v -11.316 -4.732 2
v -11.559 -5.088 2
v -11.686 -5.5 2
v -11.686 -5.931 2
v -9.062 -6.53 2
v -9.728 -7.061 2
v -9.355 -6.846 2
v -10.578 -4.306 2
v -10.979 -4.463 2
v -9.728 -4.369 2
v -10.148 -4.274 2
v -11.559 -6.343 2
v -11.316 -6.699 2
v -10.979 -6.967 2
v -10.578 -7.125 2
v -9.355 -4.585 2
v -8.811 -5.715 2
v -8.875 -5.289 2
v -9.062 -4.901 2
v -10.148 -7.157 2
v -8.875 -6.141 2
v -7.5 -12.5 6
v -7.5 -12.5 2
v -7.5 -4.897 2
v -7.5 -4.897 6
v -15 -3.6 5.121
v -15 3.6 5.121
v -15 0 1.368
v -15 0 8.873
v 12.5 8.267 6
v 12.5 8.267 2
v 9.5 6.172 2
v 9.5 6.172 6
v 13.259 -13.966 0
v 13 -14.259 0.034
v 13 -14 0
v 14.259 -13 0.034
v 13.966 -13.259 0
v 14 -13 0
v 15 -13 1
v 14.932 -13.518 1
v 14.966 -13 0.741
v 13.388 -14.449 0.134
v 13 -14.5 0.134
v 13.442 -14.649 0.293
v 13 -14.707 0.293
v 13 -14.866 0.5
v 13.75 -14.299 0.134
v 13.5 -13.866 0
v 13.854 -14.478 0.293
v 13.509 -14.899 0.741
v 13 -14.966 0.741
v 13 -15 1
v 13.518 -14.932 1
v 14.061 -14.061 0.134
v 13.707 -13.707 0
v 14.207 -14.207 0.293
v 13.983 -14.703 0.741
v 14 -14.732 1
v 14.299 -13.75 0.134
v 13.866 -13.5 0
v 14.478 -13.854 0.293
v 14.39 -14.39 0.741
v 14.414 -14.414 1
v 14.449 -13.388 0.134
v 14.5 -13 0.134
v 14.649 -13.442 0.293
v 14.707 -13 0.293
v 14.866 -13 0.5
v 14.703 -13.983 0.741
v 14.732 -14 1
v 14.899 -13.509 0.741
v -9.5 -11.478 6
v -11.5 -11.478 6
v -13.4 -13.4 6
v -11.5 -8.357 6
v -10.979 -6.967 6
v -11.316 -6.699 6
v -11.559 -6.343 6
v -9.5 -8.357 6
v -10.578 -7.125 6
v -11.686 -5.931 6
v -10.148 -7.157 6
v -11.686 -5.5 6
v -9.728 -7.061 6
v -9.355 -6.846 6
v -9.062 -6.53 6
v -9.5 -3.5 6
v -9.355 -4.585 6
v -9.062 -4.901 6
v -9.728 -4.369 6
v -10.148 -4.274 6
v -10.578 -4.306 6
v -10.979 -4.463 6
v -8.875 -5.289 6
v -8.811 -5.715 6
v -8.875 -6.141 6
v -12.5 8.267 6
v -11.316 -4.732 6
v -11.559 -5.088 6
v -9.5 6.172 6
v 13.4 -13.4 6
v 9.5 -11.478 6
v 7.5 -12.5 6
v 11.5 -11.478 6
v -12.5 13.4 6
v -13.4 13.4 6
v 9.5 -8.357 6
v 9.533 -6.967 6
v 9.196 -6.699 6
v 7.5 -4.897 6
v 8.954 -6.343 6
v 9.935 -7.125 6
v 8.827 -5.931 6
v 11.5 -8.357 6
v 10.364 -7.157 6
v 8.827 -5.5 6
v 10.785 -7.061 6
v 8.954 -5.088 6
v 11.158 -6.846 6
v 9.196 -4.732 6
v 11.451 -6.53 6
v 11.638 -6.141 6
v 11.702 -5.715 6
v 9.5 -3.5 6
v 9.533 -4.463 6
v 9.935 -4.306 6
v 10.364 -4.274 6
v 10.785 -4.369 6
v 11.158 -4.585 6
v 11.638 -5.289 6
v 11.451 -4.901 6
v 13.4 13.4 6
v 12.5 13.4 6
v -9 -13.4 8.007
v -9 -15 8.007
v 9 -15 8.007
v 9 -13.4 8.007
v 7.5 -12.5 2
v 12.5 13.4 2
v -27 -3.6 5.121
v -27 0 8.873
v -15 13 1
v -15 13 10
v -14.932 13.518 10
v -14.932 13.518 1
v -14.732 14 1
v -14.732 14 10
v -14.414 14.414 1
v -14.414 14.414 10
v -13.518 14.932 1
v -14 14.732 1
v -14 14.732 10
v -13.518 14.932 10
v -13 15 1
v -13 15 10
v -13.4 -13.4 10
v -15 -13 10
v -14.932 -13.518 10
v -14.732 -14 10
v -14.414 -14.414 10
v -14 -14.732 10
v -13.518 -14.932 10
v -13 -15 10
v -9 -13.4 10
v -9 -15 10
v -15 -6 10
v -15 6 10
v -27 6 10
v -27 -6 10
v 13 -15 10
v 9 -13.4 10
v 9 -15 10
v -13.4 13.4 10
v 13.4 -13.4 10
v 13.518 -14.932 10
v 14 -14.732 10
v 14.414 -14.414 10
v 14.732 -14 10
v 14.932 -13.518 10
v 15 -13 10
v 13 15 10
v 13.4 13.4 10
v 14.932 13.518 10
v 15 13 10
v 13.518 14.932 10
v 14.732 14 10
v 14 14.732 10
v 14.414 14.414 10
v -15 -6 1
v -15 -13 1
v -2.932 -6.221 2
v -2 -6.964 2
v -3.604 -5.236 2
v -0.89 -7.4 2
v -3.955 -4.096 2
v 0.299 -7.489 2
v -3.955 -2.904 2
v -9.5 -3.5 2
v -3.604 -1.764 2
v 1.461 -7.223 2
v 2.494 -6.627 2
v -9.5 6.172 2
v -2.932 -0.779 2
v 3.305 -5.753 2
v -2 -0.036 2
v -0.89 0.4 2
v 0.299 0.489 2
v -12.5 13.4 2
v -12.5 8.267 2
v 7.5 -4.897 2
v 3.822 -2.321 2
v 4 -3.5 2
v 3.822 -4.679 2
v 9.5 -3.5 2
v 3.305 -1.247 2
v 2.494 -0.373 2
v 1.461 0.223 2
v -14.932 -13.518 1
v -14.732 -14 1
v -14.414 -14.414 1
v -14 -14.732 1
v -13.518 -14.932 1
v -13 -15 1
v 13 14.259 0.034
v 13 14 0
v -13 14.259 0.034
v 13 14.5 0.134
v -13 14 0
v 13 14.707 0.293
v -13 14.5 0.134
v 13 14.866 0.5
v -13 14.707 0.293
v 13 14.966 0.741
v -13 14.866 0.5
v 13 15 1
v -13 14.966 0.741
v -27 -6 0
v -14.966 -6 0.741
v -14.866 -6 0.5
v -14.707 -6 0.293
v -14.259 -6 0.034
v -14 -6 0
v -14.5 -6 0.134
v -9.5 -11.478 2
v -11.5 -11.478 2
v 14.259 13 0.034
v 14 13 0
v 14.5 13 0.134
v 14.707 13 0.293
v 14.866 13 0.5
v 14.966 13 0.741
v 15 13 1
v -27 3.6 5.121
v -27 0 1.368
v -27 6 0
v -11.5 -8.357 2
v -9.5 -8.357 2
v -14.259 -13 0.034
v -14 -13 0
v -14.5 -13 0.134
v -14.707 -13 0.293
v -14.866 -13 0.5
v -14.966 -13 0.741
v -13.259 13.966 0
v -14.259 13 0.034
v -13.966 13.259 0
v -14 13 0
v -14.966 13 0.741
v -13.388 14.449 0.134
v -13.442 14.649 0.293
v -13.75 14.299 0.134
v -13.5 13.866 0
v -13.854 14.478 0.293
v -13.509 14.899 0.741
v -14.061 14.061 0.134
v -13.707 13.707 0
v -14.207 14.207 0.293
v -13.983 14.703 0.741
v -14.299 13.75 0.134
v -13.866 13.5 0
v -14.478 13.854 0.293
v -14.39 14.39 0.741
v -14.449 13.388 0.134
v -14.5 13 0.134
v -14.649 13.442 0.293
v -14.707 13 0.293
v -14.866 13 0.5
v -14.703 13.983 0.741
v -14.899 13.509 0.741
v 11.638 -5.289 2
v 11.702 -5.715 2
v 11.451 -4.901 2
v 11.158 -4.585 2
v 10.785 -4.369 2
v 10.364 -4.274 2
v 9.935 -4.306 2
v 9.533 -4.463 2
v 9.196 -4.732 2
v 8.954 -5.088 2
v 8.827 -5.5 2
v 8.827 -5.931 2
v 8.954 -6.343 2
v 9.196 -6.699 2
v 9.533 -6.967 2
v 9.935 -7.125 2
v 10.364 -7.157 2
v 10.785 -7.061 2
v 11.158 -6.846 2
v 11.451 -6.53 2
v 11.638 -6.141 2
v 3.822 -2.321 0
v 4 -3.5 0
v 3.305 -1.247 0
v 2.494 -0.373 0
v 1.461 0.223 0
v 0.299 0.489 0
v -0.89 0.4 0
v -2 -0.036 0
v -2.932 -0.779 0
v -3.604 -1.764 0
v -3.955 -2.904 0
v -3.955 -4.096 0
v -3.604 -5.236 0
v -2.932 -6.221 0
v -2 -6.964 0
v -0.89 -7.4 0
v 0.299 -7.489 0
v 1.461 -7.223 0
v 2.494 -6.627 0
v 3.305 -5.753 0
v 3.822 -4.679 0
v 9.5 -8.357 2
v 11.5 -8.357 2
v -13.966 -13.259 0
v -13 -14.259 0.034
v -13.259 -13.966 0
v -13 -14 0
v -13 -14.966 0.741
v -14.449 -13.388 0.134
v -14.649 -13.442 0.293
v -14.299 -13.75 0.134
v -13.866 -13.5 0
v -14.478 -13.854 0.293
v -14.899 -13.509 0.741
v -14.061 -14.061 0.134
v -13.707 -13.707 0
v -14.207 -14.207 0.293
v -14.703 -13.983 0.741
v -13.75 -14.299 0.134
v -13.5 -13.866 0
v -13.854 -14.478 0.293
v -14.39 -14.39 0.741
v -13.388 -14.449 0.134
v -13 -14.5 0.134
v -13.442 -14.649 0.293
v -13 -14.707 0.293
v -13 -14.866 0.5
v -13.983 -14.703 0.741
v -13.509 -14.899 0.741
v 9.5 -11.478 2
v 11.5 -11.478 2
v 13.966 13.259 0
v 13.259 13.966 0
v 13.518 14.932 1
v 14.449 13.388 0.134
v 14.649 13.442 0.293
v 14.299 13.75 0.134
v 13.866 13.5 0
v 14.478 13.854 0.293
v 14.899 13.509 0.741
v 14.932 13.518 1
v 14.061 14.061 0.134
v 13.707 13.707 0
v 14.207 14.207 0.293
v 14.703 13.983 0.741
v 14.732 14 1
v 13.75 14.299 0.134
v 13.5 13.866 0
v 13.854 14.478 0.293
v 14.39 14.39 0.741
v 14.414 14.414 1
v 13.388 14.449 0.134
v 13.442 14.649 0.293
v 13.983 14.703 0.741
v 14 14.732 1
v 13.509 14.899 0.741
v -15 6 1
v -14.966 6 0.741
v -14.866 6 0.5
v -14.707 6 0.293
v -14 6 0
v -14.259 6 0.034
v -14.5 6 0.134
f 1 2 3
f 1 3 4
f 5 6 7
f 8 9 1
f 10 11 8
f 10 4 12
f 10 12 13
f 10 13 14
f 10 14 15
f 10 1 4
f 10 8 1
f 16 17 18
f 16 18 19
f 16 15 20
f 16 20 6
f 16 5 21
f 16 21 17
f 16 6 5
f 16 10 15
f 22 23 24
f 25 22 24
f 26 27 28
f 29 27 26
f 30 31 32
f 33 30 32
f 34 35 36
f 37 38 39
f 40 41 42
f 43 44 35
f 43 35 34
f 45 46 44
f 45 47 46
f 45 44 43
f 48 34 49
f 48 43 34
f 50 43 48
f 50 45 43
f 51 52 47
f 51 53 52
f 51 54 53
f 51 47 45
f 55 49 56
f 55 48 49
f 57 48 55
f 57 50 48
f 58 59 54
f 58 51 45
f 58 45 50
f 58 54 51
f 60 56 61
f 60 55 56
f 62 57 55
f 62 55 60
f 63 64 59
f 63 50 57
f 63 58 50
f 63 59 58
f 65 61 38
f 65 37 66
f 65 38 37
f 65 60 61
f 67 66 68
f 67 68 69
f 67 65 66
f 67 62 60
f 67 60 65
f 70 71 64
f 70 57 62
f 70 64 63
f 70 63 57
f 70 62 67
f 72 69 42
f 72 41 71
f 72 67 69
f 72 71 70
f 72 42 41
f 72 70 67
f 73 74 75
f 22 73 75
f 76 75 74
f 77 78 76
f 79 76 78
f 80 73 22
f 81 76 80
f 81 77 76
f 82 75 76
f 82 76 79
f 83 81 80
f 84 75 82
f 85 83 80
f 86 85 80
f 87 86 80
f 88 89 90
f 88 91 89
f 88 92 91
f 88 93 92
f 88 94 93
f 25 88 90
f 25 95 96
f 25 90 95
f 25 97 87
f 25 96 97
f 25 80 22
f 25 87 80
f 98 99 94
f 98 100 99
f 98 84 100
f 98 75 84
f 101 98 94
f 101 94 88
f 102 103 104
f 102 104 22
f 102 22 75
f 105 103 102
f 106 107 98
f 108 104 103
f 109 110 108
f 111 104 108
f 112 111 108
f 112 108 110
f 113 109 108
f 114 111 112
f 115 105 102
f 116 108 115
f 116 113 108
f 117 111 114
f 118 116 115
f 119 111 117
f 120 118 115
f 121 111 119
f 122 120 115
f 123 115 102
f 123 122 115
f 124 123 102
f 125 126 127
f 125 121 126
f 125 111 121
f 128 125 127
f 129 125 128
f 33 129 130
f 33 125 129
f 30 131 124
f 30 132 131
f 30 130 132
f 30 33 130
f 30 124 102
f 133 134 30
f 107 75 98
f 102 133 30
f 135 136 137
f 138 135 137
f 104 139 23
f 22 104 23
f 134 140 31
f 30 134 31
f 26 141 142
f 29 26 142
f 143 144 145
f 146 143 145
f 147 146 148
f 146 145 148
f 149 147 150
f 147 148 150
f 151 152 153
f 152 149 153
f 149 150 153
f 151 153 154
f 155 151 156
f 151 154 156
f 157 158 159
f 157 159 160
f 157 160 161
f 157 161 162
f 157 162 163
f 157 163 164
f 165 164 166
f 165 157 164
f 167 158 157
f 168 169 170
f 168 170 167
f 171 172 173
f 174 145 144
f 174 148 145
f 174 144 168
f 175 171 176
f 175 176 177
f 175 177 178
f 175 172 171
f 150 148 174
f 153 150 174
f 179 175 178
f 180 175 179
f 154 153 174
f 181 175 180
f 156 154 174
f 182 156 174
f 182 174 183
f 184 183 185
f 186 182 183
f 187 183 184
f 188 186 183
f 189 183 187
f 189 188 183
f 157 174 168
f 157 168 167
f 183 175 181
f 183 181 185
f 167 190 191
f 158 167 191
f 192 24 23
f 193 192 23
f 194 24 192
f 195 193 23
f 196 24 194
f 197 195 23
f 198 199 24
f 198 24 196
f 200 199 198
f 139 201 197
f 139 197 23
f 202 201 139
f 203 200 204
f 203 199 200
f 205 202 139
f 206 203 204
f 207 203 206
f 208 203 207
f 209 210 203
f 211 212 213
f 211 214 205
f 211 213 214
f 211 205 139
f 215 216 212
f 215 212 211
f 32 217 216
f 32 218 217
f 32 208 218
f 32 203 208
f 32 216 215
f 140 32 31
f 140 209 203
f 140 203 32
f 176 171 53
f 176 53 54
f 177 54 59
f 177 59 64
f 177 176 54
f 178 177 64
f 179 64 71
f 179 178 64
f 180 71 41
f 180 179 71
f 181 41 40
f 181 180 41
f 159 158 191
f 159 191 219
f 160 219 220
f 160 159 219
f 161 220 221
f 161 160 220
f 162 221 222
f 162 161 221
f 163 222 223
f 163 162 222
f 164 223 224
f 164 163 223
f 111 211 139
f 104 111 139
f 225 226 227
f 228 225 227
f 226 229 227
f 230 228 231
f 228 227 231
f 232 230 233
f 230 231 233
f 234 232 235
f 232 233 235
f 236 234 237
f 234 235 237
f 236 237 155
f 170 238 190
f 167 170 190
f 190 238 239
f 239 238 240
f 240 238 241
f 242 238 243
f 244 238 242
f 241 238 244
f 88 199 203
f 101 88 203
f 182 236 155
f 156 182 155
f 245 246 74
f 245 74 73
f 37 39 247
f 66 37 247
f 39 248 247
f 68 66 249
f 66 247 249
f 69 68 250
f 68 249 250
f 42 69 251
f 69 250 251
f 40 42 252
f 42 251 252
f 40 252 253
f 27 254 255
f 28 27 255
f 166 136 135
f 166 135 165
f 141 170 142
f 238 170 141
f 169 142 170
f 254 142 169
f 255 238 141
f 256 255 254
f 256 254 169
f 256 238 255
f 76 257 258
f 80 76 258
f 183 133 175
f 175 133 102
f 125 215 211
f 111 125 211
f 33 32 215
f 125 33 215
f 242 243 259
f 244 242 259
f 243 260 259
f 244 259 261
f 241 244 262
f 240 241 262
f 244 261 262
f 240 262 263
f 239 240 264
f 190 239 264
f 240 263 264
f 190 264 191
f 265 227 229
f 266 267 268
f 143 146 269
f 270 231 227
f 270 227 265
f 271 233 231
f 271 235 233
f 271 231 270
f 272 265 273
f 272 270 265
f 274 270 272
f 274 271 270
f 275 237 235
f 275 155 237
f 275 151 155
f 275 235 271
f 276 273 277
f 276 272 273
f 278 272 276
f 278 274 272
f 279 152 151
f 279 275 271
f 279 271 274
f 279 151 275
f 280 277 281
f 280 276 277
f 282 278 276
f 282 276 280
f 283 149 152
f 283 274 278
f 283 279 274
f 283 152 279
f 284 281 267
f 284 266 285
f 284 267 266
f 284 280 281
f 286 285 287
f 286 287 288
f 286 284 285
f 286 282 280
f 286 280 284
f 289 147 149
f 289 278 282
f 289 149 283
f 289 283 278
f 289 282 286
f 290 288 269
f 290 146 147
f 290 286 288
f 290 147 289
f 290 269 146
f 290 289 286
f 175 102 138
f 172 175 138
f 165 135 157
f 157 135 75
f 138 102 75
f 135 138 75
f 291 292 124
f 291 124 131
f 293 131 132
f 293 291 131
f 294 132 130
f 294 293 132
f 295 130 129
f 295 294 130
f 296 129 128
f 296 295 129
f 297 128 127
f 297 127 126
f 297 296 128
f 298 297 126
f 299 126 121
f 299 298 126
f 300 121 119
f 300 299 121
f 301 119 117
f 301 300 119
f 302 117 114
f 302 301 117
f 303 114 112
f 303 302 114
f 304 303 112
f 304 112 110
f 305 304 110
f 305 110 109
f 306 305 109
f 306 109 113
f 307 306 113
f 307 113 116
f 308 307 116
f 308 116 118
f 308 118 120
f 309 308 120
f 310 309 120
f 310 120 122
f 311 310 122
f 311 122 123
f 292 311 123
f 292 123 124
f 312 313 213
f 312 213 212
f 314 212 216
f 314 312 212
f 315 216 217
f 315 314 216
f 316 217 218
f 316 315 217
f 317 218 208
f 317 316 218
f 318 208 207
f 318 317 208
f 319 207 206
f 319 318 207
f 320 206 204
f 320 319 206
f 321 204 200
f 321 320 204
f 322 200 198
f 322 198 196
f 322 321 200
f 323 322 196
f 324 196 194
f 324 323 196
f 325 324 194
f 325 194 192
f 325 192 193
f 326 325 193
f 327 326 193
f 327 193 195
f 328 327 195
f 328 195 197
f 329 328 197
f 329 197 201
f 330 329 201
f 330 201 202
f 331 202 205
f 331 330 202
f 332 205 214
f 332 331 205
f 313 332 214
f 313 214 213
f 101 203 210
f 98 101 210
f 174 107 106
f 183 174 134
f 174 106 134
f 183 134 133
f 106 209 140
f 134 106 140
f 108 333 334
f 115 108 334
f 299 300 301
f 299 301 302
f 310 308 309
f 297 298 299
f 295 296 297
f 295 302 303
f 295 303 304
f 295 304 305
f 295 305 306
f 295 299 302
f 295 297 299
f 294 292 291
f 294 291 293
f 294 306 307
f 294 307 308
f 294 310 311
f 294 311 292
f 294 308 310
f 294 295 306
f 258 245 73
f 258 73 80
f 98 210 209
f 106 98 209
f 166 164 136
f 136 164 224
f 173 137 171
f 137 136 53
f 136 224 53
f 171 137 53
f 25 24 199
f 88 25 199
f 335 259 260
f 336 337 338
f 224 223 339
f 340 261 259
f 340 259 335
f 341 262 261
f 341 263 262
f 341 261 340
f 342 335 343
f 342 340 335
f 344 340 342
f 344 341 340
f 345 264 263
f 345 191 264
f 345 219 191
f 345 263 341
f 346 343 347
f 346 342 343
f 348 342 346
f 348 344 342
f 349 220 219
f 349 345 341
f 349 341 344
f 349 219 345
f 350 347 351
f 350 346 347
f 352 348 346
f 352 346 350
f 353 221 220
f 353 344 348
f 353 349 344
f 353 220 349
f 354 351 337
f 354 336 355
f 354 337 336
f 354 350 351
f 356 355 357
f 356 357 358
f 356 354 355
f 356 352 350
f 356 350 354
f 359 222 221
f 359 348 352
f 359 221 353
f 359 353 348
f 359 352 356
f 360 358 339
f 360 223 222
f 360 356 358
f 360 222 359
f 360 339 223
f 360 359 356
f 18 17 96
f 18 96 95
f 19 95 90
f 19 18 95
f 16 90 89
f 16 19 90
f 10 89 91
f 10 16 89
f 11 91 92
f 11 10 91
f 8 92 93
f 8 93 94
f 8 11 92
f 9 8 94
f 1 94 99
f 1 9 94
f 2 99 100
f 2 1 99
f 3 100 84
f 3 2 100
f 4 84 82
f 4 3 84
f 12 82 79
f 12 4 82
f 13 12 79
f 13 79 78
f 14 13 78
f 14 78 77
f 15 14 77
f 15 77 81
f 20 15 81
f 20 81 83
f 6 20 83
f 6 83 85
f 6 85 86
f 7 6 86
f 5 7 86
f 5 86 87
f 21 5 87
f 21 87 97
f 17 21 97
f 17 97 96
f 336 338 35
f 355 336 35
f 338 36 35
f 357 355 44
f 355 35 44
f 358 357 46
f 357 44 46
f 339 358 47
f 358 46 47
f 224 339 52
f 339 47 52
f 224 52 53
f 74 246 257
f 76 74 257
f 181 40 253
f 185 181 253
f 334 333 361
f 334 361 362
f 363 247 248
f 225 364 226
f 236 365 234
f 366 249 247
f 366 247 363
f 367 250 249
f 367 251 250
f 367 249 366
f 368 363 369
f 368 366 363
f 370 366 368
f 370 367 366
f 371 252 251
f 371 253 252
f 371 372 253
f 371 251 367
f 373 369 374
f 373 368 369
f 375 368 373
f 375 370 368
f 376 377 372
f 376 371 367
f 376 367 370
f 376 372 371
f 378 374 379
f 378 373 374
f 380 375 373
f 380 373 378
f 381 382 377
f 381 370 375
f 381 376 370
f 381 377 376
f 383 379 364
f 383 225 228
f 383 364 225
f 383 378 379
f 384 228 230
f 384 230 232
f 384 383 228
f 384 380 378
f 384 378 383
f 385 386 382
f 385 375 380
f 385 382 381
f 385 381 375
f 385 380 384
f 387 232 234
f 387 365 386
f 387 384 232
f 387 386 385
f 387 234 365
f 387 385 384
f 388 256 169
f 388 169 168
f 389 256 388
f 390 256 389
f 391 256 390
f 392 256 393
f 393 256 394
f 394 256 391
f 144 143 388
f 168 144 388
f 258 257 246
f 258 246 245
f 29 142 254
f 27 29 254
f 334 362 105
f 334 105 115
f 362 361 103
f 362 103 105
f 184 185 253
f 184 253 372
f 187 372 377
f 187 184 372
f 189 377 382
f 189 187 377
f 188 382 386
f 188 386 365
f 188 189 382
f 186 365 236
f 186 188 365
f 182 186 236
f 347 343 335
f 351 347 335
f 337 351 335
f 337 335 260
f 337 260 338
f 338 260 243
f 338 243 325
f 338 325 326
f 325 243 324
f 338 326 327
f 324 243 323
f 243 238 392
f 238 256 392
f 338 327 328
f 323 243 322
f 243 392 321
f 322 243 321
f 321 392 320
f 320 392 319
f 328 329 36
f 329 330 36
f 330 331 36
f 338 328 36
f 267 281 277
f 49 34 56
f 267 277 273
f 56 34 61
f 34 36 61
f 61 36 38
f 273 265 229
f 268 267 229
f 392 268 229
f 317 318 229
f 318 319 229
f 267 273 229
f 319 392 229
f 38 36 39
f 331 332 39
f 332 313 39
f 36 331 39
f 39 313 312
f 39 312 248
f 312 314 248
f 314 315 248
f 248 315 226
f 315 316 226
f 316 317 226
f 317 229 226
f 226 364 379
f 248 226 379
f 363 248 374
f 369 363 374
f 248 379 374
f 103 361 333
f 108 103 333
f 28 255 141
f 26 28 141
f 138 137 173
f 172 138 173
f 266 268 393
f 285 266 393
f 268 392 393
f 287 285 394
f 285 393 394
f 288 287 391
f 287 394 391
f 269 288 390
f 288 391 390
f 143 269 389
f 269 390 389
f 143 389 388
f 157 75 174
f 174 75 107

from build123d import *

# Parameters (mm, degrees)
F0_W     = 12
F0_H     = 12
F1_DEPTH = 10
F0_W_2   = 2
F0_H_2   = 3.1217085198
F0_R     = 1.4457822704
F2_DEPTH = 6
F0_R_2   = 4
F0_W_3   = 25
F0_H_3   = 0.9
F3_DEPTH = 2
F5_DEPTH = 12
F6_R     = 2
F7_R     = 1
F8_W     = 18
F8_H     = 1.9928832203
F9_DEPTH = 25


# Not quite as in the source:
# - a feature names something its author has since deleted; it is built from what else it names


with BuildPart() as f1:
    # F0 (on Top) → F1 (new body)
    with BuildSketch(Plane.XY):
        Polygon((15, -15), (15, 15), (-15, 15), (-15, 6), (-15, -6), (-15, -15), align=None)
        Polygon((12.5, 13.4), (13.4, 13.4), (13.4, -13.4), (-13.4, -13.4), (-13.4, 13.4), (-12.5, 13.4), align=None, mode=Mode.SUBTRACT)
        with Locations((-21, 0)):
            Rectangle(F0_W, F0_H)
    extrude(amount=F1_DEPTH)

    # F0 (on Top) → F2 (join)
    with BuildSketch(Plane.XY):
        Polygon((-9.5, -3.5004718229), (-12.5, -1.4055506326), (-12.5, -12.5), (-7.5, -12.5), (-7.5, -4.8970859498), align=None)
        with Locations((-10.5, -9.9175968207)):
            Rectangle(F0_W_2, F0_H_2, mode=Mode.SUBTRACT)
        with Locations((-10.256325826, -5.7152966037)):
            Circle(F0_R, mode=Mode.SUBTRACT)
        Polygon((-9.5, 6.1722276732), (-12.5, 8.2671488635), (-12.5, -1.4055506326), (-9.5, -3.5004718229), align=None)
        Polygon((12.5, -1.4055506326), (12.5, 8.2671488635), (9.5, 6.1722276732), (9.5, -3.5004718229), align=None)
        Polygon((12.5, -12.5), (12.5, -1.4055506326), (9.5, -3.5004718229), (7.5, -4.8970859498), (7.5, -12.5), align=None)
        with Locations((10.5, -9.9175968207)):
            Rectangle(F0_W_2, F0_H_2, mode=Mode.SUBTRACT)
        with Locations((10.256325826, -5.7152966037)):
            Circle(F0_R, mode=Mode.SUBTRACT)
        Polygon((13.4, -13.4), (13.4, 13.4), (12.5, 13.4), (12.5, 12.5), (12.5, 8.2671488635), (12.5, -1.4055506326), (12.5, -12.5), (7.5, -12.5), (-7.5, -12.5), (-12.5, -12.5), (-12.5, -1.4055506326), (-12.5, 8.2671488635), (-12.5, 12.5), (-12.5, 13.4), (-13.4, 13.4), (-13.4, -13.4), align=None)
    extrude(amount=F2_DEPTH)

    # F0 (on Top) → F3 (join)
    with BuildSketch(Plane.XY):
        Polygon((12.5, 8.2671488635), (12.5, 12.5), (-12.5, 12.5), (-12.5, 8.2671488635), (-9.5, 6.1722276732), (-9.5, -3.5004718229), (-7.5, -4.8970859498), (-7.5, -12.5), (7.5, -12.5), (7.5, -4.8970859498), (9.5, -3.5004718229), (9.5, 6.1722276732), align=None)
        with Locations((0, -3.5)):
            Circle(F0_R_2, mode=Mode.SUBTRACT)
        with Locations((10.256325826, -5.7152966037)):
            Circle(F0_R)
        with Locations((10.5, -9.9175968207)):
            Rectangle(F0_W_2, F0_H_2)
        with Locations((-10.5, -9.9175968207)):
            Rectangle(F0_W_2, F0_H_2)
        with Locations((-10.256325826, -5.7152966037)):
            Circle(F0_R)
        with Locations((0, 12.95)):
            Rectangle(F0_W_3, F0_H_3)
    extrude(amount=F3_DEPTH)

    # F4 (on face) → F5 (cut)
    with BuildSketch(Plane(origin=(-27, 0, 0), x_dir=(0, -1, 0), z_dir=(-1, 0, 0))):
        Polygon((-3.6, 5.1207184246), (3.6, 5.1207184246), (0, 8.8730510324), align=None)
        Polygon((0, 1.3683858167), (3.6, 5.1207184246), (-3.6, 5.1207184246), align=None)
    extrude(amount=-F5_DEPTH, mode=Mode.SUBTRACT)

    # F6
    f6_edges = [f1.edges().sort_by_distance(p)[0] for p in [
        (15, 15, 5),
        (-15, 15, 5),
        (-15, -15, 5),
        (15, -15, 5),
    ]]
    fillet(f6_edges, radius=F6_R)

    # F7
    f7_edges = [f1.edges().sort_by_distance(p)[0] for p in [
        (-15, -9.5, 0),
        (0, -15, 0),
    ]]
    fillet(f7_edges, radius=F7_R)

    # F8 (on face) → F9 (cut)
    with BuildSketch(Plane.XZ.offset(15)):
        with Locations((0, 9.0035583898)):
            Rectangle(F8_W, F8_H)
    extrude(amount=-F9_DEPTH, mode=Mode.SUBTRACT)


solid = f1.part
